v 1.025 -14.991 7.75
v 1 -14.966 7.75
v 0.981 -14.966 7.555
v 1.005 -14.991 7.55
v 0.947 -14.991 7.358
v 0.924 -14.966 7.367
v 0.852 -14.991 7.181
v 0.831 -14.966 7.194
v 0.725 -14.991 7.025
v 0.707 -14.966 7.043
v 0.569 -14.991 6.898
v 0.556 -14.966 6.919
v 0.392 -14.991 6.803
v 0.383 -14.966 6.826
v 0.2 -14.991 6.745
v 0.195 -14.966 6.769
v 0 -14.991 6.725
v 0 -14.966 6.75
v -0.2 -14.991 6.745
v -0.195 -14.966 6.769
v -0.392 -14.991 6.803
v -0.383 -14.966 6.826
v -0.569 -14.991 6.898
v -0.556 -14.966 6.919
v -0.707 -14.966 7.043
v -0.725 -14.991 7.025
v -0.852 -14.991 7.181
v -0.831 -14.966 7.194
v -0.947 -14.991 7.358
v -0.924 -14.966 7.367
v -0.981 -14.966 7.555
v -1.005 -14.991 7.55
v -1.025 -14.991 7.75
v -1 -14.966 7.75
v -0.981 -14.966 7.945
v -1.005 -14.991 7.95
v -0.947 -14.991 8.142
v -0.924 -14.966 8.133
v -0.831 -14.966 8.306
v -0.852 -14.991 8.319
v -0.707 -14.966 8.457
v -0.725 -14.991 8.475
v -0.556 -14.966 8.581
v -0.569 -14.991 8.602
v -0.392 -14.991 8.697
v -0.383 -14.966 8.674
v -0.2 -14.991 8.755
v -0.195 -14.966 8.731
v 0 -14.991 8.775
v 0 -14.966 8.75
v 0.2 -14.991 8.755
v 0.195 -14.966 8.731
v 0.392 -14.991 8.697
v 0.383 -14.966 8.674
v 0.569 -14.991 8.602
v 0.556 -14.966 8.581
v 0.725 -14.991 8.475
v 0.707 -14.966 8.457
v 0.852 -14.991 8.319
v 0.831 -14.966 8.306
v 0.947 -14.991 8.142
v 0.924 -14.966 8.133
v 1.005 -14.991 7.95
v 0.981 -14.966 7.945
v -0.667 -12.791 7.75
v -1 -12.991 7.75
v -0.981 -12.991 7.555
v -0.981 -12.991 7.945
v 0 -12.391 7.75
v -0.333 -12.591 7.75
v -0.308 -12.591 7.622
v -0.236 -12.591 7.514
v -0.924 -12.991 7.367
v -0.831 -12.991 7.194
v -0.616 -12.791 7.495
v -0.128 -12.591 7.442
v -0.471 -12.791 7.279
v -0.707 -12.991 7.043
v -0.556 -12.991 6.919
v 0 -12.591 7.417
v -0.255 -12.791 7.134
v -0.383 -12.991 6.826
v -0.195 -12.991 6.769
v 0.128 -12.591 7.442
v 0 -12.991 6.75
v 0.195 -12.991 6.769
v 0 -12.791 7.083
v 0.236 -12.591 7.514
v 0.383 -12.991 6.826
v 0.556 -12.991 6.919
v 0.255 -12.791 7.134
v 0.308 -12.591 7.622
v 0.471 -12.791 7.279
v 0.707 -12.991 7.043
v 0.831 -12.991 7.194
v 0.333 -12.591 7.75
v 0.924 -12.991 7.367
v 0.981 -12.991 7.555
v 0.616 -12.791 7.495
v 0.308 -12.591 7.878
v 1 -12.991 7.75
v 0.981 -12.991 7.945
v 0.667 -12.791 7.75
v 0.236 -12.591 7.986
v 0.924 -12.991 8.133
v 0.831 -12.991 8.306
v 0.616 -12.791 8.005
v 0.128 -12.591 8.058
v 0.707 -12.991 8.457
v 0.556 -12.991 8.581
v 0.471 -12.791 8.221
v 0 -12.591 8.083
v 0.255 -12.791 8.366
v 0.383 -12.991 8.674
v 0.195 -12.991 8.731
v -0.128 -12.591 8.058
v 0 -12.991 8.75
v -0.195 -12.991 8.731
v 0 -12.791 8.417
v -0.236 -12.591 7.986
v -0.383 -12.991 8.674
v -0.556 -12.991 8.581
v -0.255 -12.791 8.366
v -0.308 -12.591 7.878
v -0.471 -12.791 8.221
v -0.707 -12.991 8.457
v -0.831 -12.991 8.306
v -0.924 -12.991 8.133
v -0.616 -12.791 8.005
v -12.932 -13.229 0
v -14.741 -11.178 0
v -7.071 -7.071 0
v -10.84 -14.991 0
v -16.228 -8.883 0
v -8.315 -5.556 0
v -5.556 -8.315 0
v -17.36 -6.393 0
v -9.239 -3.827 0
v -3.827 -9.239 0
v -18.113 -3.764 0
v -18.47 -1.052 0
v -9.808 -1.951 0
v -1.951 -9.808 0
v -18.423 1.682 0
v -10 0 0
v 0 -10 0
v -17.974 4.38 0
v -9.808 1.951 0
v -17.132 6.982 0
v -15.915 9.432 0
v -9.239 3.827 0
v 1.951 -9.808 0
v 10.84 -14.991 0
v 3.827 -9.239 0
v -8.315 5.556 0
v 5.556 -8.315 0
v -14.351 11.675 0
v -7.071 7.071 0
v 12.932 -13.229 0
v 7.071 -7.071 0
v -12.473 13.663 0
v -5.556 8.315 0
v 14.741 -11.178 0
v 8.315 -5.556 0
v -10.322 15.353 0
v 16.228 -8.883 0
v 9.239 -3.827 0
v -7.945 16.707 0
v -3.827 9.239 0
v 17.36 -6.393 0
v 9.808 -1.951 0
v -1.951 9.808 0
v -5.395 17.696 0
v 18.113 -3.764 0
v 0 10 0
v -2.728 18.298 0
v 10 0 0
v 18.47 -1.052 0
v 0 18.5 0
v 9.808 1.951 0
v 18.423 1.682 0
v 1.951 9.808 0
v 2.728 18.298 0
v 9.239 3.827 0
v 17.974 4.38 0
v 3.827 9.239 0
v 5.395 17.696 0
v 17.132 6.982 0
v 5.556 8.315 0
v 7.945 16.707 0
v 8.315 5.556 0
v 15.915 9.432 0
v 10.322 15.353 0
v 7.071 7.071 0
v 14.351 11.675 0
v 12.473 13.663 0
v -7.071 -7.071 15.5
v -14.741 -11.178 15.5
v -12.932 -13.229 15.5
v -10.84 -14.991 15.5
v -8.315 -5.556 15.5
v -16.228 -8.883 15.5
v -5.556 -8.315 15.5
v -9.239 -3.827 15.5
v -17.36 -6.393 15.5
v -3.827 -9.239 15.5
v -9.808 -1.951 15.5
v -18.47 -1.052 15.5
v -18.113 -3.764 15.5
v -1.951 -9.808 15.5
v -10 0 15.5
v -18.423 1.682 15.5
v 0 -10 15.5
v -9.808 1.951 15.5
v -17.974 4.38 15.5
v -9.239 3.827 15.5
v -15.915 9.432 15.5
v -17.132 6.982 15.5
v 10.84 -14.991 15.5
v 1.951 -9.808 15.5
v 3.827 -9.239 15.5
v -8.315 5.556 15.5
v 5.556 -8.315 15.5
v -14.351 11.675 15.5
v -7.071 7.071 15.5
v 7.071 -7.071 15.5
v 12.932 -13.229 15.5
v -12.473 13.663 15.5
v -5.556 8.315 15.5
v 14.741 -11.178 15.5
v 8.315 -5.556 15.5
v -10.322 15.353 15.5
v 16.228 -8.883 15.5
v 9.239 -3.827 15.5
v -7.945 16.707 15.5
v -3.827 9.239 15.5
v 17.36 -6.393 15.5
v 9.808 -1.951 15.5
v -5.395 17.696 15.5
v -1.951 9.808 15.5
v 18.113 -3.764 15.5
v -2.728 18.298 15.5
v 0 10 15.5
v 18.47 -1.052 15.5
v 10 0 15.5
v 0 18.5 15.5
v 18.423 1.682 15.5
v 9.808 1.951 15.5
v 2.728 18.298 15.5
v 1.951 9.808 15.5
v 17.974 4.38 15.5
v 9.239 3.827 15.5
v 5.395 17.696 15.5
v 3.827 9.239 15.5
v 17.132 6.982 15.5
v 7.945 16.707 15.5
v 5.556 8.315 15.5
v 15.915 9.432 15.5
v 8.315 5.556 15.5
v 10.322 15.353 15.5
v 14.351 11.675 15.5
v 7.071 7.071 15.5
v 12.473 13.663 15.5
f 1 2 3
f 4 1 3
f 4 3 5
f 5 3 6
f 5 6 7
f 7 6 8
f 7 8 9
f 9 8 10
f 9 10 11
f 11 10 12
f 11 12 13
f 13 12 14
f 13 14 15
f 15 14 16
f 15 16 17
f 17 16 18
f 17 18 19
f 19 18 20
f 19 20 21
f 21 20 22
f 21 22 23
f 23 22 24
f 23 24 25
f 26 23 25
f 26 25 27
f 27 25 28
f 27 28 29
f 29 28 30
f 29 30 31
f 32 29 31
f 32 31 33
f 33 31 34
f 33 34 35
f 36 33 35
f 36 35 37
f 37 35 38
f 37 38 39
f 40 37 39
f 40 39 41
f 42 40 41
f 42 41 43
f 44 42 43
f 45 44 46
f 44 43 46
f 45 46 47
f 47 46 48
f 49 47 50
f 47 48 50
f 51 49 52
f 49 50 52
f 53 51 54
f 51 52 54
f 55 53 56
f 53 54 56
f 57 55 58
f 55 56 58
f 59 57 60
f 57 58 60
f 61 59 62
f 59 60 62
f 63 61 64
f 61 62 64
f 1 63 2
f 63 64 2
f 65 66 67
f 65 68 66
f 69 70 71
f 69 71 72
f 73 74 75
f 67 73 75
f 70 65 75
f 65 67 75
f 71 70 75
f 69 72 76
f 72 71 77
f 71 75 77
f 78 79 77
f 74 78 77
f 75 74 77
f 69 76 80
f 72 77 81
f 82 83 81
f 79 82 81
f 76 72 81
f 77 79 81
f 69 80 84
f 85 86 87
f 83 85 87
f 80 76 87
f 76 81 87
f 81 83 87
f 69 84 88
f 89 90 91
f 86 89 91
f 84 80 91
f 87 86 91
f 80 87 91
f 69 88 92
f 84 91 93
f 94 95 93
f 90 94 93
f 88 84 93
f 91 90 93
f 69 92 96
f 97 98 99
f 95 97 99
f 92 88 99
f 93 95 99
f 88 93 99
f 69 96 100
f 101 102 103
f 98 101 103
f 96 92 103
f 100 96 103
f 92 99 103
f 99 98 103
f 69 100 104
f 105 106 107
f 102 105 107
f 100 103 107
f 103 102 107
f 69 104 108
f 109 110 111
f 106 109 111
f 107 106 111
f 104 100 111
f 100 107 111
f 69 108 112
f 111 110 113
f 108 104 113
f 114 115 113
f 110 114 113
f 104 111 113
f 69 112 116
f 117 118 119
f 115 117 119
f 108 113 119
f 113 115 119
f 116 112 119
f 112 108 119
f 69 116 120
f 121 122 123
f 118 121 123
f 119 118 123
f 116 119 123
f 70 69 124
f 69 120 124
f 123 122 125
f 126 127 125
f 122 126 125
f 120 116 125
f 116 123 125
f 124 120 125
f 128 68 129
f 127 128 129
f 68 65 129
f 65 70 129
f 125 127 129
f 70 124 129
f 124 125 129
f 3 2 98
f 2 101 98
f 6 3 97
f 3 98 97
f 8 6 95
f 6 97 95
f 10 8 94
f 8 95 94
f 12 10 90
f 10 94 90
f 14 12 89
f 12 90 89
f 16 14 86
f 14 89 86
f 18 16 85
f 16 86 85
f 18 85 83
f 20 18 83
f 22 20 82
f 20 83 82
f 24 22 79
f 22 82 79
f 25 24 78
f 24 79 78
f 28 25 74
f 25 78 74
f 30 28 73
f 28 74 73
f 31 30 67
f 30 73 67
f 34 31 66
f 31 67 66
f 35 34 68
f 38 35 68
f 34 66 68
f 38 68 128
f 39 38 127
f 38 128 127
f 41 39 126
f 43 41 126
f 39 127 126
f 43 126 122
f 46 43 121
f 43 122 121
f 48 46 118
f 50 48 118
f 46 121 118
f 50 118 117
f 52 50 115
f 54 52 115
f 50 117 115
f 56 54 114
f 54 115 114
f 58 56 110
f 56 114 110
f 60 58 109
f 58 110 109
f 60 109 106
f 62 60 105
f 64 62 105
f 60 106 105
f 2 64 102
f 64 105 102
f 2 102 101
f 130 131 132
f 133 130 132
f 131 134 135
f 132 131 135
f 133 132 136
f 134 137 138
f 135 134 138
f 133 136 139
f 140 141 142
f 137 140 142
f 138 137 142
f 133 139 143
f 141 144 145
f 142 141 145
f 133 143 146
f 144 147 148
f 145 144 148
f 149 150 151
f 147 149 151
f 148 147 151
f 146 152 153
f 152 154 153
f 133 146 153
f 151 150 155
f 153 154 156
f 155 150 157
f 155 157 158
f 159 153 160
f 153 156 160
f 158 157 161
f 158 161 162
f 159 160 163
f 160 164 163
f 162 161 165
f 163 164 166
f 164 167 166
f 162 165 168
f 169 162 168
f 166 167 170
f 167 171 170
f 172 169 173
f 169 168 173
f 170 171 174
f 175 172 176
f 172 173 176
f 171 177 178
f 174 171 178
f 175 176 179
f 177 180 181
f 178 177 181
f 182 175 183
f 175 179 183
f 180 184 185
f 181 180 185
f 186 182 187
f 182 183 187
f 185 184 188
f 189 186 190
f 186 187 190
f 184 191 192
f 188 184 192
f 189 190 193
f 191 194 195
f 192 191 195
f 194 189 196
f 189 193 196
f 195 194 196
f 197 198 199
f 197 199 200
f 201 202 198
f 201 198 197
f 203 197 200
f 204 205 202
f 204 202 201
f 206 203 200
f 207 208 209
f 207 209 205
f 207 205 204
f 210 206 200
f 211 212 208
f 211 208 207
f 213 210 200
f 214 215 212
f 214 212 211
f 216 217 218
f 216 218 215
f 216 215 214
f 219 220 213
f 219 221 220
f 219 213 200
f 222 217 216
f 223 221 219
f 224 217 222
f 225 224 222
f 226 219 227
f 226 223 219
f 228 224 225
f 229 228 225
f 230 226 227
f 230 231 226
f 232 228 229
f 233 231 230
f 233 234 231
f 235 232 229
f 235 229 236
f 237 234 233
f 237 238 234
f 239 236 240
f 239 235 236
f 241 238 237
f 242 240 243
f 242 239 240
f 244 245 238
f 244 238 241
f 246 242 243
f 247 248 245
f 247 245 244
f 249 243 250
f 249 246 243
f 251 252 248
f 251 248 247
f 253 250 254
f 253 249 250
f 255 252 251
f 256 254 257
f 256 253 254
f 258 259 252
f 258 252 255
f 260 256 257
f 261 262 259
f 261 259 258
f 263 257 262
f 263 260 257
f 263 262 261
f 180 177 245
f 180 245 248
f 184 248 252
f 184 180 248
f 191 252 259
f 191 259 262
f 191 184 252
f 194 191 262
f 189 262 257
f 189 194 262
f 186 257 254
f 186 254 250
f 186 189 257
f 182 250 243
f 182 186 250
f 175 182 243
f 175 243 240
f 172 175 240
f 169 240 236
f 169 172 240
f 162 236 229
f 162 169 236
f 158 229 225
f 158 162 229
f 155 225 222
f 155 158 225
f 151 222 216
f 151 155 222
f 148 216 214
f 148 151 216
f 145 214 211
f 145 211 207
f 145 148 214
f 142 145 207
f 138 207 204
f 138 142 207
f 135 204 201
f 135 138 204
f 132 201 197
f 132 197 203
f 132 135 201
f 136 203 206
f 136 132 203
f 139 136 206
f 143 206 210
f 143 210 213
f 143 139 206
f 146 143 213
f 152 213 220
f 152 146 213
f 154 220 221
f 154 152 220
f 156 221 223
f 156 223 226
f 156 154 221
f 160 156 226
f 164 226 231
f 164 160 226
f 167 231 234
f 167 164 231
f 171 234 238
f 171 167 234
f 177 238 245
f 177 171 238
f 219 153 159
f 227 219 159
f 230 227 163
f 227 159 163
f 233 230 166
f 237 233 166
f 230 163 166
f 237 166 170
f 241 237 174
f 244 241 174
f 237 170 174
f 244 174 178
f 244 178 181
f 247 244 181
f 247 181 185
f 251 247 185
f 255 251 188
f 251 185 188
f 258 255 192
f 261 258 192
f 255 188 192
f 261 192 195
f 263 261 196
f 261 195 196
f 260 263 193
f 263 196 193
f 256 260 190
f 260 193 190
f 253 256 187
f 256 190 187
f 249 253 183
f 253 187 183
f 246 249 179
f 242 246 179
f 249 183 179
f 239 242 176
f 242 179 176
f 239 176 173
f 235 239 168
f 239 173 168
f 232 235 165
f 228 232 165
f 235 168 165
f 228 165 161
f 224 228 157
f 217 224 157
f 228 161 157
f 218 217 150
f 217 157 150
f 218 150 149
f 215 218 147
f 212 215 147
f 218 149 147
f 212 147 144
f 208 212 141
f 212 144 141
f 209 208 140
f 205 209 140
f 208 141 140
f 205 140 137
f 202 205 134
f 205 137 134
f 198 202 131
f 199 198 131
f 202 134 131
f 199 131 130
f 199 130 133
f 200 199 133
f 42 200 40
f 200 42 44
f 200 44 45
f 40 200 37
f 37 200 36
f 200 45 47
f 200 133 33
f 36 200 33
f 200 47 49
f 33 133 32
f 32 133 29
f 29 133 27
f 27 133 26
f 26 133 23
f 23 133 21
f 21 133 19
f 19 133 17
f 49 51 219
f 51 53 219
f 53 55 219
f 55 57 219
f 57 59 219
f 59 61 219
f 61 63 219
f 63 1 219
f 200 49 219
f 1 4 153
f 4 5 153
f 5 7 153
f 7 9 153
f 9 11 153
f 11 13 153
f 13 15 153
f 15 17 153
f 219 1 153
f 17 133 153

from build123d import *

# Parameters (mm, degrees)
SKETCH1_R                          = 10
BOSS_EXTRUDE1_DEPTH                = 15.5
F_2_0_2_DIAMETER_HOLE1_D           = 2
F_2_0_2_DIAMETER_HOLE1_DEPTH       = 2
F_2_0_2_DIAMETER_HOLE1_CSINK_D     = 2.05
F_2_0_2_DIAMETER_HOLE1_CSINK_ANGLE = 90
F_2_0_2_DIAMETER_HOLE1_TIP         = 0.600860619


with BuildPart() as part:
    # Sketch1 → Boss-Extrude1 (new body)
    with BuildSketch(Plane.XY):
        with BuildLine():
            Line((-10.84, -14.991477579), (10.84, -14.991477579))
            ThreePointArc((10.84, -14.991477579), (0, 18.5), (-10.84, -14.991477579))
        make_face()
        Circle(SKETCH1_R, mode=Mode.SUBTRACT)
    extrude(amount=BOSS_EXTRUDE1_DEPTH)

    # Ø2.0 (2) Diameter Hole1
    with Locations(Plane(origin=(0, -14.991477579, 0), x_dir=(-1, 0, 0), z_dir=(0, -1, 0))):
        with Locations((0, -7.75)):
            CounterSinkHole(F_2_0_2_DIAMETER_HOLE1_D / 2, F_2_0_2_DIAMETER_HOLE1_CSINK_D / 2, depth=F_2_0_2_DIAMETER_HOLE1_DEPTH, counter_sink_angle=F_2_0_2_DIAMETER_HOLE1_CSINK_ANGLE)
            with Locations((0, 0, -(F_2_0_2_DIAMETER_HOLE1_DEPTH + F_2_0_2_DIAMETER_HOLE1_TIP / 2))):  # 118° drill point
                Cone(0, F_2_0_2_DIAMETER_HOLE1_D / 2, F_2_0_2_DIAMETER_HOLE1_TIP, mode=Mode.SUBTRACT)


solid = part.part
